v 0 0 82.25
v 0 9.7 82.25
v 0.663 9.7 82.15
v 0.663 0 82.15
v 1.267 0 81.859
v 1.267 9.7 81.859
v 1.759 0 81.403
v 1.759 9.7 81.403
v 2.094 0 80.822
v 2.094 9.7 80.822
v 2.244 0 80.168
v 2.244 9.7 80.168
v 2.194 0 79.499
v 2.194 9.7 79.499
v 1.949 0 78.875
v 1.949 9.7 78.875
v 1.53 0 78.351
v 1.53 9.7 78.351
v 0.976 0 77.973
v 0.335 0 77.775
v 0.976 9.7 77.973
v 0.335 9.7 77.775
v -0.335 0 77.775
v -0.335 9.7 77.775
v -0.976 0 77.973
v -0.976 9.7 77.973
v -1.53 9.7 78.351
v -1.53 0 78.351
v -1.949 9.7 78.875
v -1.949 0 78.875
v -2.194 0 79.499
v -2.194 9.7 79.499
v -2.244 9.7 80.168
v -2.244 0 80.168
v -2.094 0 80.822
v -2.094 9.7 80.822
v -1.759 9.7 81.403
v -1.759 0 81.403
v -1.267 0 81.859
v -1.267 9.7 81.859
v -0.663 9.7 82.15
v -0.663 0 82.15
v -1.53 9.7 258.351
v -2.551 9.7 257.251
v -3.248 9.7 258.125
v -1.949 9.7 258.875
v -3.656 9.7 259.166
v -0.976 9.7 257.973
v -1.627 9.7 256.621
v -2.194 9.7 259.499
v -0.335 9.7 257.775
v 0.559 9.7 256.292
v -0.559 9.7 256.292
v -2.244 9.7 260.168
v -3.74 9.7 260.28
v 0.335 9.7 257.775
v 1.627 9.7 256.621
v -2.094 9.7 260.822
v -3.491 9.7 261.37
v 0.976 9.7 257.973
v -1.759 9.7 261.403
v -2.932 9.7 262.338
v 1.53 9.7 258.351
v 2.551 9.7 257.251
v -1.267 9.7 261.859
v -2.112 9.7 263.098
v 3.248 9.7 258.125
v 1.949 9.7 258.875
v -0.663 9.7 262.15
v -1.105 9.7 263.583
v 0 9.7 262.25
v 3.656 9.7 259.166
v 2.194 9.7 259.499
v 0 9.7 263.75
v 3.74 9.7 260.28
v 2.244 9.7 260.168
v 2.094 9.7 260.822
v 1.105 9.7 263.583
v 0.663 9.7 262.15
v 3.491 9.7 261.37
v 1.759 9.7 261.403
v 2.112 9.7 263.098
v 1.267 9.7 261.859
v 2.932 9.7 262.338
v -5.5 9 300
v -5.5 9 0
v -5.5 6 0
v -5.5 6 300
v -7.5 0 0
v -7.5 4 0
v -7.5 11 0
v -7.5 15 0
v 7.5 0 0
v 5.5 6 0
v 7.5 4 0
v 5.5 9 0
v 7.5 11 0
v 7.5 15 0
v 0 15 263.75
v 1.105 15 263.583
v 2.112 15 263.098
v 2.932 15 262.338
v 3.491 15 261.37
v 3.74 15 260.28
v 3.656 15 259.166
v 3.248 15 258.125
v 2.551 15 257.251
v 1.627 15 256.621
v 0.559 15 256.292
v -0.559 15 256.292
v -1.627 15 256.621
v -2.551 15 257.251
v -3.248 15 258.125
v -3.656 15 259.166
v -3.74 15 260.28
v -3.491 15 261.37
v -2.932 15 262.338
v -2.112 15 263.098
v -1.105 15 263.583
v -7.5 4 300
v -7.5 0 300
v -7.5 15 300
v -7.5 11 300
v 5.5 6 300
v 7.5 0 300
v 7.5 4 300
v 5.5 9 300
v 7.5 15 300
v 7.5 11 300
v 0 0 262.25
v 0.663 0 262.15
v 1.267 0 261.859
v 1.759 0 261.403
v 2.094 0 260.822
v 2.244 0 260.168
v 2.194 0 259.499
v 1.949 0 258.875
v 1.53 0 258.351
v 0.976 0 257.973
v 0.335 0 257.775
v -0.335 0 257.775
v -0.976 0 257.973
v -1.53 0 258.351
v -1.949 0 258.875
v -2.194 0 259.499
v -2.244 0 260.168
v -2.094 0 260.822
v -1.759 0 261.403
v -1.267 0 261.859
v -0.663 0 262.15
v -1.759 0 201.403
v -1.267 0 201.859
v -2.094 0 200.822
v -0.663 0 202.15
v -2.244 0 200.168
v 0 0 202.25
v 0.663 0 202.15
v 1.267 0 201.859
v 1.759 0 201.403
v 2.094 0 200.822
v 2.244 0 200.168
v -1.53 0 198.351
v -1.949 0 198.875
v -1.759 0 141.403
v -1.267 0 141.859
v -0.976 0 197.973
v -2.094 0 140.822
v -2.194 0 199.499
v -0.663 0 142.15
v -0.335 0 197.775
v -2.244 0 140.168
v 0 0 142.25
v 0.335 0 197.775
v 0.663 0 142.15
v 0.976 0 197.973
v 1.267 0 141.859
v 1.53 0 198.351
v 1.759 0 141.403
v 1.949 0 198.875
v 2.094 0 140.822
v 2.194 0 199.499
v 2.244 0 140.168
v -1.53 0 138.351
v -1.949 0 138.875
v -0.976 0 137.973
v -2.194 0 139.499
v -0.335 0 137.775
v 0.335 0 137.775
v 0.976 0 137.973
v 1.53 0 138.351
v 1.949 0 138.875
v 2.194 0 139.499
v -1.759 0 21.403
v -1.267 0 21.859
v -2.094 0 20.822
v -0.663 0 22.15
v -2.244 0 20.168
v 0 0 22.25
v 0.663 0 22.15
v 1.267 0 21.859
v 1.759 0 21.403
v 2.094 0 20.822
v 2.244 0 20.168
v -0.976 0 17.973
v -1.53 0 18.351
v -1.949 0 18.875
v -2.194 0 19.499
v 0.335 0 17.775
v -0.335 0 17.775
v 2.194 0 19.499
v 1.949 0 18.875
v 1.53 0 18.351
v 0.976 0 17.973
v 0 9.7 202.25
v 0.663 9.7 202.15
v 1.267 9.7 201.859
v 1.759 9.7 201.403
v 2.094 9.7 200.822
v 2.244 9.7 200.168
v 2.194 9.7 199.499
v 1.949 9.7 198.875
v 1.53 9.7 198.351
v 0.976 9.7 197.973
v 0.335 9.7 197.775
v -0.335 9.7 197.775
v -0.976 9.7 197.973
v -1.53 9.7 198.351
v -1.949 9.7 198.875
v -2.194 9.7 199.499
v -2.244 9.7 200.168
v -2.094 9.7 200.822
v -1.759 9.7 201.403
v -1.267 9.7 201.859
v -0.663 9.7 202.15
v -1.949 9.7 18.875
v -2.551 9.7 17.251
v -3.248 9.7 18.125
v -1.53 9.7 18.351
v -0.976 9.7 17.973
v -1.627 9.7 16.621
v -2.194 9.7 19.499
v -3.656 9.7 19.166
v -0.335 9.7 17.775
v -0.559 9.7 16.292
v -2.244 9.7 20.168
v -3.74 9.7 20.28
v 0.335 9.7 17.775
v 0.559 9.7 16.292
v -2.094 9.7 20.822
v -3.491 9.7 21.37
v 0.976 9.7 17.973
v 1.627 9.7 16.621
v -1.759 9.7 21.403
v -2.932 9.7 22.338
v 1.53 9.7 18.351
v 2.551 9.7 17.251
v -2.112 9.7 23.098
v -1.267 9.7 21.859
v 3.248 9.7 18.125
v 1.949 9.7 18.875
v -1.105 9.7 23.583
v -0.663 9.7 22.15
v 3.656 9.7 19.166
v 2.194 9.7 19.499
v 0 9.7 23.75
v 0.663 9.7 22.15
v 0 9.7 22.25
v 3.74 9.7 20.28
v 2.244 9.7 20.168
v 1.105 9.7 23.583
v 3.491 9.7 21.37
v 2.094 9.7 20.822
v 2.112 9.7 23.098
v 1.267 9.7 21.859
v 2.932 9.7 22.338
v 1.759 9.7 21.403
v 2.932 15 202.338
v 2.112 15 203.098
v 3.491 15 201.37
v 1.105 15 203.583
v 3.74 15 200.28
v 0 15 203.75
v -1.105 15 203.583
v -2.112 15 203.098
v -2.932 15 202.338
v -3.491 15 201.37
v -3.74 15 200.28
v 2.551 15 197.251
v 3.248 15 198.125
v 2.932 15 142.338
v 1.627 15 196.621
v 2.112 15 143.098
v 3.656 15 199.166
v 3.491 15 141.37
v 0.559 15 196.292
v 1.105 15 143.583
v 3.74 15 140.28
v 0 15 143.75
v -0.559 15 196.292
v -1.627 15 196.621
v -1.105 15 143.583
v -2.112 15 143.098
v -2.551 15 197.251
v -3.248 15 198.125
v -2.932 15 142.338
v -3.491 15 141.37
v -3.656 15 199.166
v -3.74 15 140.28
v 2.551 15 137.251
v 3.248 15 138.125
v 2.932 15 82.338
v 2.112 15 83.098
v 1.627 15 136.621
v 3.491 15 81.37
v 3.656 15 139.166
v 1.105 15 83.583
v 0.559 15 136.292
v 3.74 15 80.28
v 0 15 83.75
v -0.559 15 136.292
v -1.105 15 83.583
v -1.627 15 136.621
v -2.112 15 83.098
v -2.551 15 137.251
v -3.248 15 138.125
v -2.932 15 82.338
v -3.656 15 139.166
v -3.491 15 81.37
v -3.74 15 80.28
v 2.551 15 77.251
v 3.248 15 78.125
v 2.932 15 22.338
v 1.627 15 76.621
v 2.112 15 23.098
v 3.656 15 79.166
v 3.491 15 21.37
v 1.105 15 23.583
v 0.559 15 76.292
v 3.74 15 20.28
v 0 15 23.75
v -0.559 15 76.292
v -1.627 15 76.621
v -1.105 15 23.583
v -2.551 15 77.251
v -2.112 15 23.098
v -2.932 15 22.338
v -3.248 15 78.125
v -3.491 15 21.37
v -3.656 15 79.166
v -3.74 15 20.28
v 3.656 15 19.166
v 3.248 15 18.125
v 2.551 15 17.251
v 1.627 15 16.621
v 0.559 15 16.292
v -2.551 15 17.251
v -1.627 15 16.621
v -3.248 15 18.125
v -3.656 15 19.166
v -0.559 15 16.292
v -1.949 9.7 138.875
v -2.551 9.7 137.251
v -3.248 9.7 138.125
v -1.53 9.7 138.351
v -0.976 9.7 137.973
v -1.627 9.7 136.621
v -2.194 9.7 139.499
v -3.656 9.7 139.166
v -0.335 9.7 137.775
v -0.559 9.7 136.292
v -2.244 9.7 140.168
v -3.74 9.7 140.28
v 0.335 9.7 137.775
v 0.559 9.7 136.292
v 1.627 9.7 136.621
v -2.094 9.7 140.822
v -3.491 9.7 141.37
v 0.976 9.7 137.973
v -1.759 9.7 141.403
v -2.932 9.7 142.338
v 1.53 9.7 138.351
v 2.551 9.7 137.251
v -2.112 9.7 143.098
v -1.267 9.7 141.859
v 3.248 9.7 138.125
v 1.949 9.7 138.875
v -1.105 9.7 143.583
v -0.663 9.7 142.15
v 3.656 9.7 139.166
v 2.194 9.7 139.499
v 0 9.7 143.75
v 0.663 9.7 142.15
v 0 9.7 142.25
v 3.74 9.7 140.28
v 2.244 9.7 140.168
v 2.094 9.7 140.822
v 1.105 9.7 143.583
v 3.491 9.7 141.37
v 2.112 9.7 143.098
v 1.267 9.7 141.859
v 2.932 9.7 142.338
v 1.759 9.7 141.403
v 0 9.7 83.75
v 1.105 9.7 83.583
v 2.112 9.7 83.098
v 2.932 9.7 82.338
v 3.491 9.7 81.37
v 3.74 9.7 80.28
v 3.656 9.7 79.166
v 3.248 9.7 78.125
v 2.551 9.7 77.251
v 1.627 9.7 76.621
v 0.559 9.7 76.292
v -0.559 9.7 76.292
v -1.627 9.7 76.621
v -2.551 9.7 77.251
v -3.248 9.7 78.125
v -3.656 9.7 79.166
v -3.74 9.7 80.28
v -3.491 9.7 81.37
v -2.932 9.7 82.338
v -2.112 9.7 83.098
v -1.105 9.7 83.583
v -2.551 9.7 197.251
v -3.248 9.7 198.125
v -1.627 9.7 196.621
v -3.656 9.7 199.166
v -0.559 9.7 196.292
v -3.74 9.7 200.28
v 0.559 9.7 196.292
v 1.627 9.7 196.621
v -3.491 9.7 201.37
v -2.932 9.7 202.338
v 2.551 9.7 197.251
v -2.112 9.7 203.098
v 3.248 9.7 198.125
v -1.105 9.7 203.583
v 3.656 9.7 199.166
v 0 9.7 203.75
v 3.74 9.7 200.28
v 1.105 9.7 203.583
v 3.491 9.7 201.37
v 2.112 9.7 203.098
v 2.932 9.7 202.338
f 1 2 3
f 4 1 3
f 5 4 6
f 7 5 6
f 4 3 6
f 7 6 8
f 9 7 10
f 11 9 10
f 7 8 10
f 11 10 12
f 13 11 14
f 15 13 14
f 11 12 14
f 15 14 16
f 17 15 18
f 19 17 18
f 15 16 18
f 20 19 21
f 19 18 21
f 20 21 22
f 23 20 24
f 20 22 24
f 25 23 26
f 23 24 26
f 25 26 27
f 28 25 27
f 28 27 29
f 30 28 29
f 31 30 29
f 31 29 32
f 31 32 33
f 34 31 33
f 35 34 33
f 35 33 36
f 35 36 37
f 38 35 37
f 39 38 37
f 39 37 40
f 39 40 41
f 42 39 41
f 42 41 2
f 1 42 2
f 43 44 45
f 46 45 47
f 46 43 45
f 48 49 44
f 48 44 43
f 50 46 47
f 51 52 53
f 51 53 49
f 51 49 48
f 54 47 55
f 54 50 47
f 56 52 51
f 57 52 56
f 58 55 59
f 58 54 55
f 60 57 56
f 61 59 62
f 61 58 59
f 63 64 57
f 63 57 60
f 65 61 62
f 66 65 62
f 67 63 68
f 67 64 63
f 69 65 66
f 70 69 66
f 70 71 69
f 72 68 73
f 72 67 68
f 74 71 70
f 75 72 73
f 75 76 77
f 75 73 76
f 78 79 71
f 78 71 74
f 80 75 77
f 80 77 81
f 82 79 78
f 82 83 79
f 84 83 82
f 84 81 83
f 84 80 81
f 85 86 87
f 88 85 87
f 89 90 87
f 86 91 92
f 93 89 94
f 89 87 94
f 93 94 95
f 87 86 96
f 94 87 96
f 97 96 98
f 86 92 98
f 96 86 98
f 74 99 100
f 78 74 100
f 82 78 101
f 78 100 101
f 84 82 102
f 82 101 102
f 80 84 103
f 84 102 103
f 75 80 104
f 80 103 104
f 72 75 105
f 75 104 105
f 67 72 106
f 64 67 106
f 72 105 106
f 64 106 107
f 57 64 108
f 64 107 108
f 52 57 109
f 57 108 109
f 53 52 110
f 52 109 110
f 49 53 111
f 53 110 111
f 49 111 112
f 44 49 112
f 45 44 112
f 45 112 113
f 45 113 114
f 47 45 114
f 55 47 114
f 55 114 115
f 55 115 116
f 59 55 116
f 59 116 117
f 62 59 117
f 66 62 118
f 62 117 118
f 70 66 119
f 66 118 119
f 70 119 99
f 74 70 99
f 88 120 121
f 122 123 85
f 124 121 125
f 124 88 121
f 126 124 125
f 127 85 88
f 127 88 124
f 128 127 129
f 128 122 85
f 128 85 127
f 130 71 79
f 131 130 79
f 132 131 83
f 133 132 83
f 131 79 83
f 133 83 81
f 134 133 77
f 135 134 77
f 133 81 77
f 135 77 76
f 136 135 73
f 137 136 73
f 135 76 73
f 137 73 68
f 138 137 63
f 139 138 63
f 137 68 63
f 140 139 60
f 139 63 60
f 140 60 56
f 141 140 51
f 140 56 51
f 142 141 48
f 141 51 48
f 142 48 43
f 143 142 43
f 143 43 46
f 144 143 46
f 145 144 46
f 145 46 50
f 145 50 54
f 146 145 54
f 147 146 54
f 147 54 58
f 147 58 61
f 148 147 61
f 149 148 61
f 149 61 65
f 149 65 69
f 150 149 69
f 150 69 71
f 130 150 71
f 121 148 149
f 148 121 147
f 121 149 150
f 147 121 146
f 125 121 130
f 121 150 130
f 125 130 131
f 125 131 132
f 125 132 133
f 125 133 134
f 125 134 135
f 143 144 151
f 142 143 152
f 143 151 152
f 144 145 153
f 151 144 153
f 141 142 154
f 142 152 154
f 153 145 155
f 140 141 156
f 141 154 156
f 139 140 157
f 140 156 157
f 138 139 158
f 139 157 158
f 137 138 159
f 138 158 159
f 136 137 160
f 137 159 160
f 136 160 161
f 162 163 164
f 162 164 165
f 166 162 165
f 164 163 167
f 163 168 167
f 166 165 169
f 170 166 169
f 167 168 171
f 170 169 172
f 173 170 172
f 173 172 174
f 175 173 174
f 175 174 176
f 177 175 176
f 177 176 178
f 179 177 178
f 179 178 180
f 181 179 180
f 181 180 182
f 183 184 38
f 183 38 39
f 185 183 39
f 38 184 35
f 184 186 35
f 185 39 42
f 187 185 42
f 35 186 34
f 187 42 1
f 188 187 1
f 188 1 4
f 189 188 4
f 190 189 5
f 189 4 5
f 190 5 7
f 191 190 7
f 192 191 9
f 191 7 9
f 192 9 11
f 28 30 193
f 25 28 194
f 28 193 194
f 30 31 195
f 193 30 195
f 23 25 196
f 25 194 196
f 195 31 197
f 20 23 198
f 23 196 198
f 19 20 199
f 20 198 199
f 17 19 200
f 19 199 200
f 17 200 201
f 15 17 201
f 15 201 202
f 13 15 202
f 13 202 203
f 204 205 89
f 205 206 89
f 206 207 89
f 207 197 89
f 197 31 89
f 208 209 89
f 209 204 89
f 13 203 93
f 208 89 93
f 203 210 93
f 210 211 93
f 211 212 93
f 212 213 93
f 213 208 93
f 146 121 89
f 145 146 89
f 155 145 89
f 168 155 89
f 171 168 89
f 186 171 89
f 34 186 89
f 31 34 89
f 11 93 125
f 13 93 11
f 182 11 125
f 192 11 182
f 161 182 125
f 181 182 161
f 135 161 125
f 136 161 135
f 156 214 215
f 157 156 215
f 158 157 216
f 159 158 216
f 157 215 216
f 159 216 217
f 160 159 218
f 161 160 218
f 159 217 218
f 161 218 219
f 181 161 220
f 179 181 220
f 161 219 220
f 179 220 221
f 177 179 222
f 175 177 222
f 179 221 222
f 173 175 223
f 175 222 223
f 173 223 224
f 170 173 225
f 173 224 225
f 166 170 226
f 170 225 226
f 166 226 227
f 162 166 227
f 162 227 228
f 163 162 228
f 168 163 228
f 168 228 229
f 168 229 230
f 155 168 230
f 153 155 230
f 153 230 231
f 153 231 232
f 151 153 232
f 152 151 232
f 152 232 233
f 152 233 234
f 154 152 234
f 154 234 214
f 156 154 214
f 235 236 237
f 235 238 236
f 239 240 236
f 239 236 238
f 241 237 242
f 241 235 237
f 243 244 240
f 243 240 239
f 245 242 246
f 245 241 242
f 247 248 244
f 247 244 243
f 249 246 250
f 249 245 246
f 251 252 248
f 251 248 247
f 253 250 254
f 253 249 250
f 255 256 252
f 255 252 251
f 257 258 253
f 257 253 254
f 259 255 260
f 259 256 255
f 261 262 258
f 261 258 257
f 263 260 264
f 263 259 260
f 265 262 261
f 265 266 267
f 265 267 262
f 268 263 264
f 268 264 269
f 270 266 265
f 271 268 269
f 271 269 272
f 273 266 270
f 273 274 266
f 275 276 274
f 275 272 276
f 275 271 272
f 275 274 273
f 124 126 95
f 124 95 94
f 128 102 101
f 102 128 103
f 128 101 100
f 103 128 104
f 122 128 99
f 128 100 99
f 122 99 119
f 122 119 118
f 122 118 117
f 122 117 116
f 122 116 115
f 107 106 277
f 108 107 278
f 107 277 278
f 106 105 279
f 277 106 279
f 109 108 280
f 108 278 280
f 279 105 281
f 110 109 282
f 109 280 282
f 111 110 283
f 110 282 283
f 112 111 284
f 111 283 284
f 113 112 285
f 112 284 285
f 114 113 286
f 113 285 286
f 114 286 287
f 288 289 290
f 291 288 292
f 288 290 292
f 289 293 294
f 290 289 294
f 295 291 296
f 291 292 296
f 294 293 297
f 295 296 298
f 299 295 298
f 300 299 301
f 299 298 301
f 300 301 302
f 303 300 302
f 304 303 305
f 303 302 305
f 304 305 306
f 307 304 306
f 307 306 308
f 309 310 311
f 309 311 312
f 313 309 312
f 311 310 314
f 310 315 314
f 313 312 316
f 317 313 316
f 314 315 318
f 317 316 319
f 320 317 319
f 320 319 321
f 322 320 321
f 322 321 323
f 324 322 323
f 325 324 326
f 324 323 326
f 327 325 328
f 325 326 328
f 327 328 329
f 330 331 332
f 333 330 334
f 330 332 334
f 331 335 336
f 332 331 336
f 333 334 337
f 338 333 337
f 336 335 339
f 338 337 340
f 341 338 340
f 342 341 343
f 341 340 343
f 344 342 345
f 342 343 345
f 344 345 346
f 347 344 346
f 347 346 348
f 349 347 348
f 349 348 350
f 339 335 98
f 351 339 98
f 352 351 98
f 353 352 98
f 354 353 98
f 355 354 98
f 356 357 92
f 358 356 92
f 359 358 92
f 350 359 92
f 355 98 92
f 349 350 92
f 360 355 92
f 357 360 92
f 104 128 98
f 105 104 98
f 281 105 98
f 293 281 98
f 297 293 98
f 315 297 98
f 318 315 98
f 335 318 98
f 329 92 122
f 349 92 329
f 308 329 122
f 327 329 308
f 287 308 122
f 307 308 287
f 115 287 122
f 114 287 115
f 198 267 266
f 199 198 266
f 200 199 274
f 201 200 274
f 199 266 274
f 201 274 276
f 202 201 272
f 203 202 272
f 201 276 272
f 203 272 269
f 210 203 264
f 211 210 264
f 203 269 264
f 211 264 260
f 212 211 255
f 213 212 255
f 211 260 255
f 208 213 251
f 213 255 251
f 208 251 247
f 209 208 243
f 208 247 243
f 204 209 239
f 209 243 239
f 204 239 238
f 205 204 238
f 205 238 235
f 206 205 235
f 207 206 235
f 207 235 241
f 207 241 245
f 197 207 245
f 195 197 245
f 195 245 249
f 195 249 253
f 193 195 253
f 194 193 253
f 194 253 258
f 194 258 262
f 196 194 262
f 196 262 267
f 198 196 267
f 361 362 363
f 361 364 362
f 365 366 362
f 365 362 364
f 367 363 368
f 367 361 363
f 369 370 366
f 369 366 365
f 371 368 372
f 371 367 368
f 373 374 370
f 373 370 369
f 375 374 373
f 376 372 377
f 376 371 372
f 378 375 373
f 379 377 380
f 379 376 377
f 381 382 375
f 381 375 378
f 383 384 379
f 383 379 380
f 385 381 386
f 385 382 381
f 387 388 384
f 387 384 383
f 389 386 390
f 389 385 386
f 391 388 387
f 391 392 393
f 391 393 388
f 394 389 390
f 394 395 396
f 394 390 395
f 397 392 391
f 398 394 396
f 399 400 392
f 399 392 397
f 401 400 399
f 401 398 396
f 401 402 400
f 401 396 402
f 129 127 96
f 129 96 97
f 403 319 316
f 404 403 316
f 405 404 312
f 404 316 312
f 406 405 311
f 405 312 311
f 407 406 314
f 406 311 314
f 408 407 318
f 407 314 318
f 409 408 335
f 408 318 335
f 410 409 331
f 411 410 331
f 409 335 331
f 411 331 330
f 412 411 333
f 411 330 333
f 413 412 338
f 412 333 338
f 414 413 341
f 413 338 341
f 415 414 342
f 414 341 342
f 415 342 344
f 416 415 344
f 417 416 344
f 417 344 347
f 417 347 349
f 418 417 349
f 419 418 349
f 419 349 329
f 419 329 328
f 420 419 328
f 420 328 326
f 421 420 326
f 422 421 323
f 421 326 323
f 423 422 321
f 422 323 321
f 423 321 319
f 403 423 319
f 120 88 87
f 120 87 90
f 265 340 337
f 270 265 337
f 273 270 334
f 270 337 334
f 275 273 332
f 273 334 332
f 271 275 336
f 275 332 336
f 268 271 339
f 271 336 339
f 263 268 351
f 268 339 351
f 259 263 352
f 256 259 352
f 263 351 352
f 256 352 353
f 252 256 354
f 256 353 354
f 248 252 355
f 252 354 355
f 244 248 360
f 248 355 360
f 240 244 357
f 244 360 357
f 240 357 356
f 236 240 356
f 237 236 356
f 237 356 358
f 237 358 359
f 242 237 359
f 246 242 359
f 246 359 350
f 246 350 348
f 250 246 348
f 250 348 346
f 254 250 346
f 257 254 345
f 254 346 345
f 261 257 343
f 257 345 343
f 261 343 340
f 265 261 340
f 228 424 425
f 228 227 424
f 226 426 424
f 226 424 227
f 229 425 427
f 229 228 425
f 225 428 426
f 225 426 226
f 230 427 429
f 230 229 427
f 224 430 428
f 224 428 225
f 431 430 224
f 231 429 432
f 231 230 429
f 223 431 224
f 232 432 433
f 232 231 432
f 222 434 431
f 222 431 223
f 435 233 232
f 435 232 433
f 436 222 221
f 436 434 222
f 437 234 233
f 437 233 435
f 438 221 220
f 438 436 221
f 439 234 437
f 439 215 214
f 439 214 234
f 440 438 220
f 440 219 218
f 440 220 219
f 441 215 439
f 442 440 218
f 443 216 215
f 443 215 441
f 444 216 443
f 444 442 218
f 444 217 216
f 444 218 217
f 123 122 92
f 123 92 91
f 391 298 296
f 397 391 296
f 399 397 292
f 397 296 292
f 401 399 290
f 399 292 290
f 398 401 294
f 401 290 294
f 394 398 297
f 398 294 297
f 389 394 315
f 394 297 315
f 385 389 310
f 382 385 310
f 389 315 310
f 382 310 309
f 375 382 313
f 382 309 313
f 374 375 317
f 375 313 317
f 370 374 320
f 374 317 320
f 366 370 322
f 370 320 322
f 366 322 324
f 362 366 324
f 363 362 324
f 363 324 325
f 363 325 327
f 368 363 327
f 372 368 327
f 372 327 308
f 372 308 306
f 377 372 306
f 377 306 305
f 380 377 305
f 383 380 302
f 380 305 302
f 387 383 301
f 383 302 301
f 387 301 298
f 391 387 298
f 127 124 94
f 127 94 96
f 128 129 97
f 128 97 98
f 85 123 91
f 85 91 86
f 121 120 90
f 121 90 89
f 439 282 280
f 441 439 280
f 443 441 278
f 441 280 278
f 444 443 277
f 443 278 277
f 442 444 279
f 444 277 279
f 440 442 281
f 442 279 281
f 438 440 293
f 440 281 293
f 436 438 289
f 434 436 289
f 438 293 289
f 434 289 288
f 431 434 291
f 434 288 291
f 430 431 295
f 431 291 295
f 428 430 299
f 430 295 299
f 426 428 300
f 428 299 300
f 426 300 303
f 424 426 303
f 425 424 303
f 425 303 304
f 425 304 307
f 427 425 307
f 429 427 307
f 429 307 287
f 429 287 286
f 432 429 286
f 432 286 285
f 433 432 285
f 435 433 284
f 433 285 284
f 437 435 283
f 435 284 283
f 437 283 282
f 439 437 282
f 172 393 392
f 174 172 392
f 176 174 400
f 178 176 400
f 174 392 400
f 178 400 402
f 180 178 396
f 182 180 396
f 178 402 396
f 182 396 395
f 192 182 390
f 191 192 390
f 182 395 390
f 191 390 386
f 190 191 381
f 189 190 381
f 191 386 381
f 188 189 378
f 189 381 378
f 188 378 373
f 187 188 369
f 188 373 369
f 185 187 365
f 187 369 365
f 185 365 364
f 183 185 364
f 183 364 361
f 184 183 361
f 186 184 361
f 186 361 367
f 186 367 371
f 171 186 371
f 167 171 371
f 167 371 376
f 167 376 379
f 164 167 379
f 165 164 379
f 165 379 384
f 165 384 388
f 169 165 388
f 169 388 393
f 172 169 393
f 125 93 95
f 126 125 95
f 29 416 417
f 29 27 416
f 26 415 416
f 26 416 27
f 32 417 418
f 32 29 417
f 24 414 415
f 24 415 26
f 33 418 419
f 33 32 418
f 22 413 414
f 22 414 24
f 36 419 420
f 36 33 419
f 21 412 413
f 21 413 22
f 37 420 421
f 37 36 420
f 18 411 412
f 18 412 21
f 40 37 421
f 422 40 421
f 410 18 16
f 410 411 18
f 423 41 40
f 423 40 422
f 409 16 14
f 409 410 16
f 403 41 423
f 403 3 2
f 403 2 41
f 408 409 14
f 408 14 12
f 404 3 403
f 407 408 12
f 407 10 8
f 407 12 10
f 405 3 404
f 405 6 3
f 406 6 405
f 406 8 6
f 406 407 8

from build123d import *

# Parameters (mm, degrees)
BOSS_EXTRUDE1_DEPTH = 300
SKETCH2_R           = 3.75
CUT_EXTRUDE1_DEPTH  = 5.3
SKETCH3_R           = 2.25
CUT_EXTRUDE2_DEPTH  = 301.46838436


with BuildPart() as part:
    # Sketch1 → Boss-Extrude1 (new body)
    with BuildSketch(Plane.XY):
        Polygon((-7.5, 0), (7.5, 0), (7.5, 4), (5.5, 6), (5.5, 9), (7.5, 11), (7.5, 15), (-7.5, 15), (-7.5, 11), (-5.5, 9), (-5.5, 6), (-7.5, 4), align=None)
    extrude(amount=BOSS_EXTRUDE1_DEPTH)

    # Sketch2 → Cut-Extrude1 (cut)
    with BuildSketch(Plane(origin=(0, 15, 0), x_dir=(1, 0, 0), z_dir=(0, 1, 0))):
        with Locations(Location((0, -20, 0), (0, 0, 270))):
            Circle(SKETCH2_R)
        with Locations(Location((0, -80, 0), (0, 0, 270))):
            Circle(SKETCH2_R)
        with Locations(Location((0, -140, 0), (0, 0, 270))):
            Circle(SKETCH2_R)
        with Locations(Location((0, -200, 0), (0, 0, 270))):
            Circle(SKETCH2_R)
        with Locations(Location((0, -260, 0), (0, 0, 270))):
            Circle(SKETCH2_R)
    extrude(amount=-CUT_EXTRUDE1_DEPTH, mode=Mode.SUBTRACT)

    # Sketch3 → Cut-Extrude2 (cut, through all)
    with BuildSketch(Plane(origin=(0, 15, 0), x_dir=(1, 0, 0), z_dir=(0, 1, 0))):
        with Locations(Location((0, -20, 0), (0, 0, 270))):
            Circle(SKETCH3_R)
        with Locations(Location((0, -80, 0), (0, 0, 270))):
            Circle(SKETCH3_R)
        with Locations(Location((0, -140, 0), (0, 0, 270))):
            Circle(SKETCH3_R)
        with Locations(Location((0, -200, 0), (0, 0, 270))):
            Circle(SKETCH3_R)
        with Locations(Location((0, -260, 0), (0, 0, 270))):
            Circle(SKETCH3_R)
    extrude(amount=-CUT_EXTRUDE2_DEPTH, mode=Mode.SUBTRACT)


solid = part.part
